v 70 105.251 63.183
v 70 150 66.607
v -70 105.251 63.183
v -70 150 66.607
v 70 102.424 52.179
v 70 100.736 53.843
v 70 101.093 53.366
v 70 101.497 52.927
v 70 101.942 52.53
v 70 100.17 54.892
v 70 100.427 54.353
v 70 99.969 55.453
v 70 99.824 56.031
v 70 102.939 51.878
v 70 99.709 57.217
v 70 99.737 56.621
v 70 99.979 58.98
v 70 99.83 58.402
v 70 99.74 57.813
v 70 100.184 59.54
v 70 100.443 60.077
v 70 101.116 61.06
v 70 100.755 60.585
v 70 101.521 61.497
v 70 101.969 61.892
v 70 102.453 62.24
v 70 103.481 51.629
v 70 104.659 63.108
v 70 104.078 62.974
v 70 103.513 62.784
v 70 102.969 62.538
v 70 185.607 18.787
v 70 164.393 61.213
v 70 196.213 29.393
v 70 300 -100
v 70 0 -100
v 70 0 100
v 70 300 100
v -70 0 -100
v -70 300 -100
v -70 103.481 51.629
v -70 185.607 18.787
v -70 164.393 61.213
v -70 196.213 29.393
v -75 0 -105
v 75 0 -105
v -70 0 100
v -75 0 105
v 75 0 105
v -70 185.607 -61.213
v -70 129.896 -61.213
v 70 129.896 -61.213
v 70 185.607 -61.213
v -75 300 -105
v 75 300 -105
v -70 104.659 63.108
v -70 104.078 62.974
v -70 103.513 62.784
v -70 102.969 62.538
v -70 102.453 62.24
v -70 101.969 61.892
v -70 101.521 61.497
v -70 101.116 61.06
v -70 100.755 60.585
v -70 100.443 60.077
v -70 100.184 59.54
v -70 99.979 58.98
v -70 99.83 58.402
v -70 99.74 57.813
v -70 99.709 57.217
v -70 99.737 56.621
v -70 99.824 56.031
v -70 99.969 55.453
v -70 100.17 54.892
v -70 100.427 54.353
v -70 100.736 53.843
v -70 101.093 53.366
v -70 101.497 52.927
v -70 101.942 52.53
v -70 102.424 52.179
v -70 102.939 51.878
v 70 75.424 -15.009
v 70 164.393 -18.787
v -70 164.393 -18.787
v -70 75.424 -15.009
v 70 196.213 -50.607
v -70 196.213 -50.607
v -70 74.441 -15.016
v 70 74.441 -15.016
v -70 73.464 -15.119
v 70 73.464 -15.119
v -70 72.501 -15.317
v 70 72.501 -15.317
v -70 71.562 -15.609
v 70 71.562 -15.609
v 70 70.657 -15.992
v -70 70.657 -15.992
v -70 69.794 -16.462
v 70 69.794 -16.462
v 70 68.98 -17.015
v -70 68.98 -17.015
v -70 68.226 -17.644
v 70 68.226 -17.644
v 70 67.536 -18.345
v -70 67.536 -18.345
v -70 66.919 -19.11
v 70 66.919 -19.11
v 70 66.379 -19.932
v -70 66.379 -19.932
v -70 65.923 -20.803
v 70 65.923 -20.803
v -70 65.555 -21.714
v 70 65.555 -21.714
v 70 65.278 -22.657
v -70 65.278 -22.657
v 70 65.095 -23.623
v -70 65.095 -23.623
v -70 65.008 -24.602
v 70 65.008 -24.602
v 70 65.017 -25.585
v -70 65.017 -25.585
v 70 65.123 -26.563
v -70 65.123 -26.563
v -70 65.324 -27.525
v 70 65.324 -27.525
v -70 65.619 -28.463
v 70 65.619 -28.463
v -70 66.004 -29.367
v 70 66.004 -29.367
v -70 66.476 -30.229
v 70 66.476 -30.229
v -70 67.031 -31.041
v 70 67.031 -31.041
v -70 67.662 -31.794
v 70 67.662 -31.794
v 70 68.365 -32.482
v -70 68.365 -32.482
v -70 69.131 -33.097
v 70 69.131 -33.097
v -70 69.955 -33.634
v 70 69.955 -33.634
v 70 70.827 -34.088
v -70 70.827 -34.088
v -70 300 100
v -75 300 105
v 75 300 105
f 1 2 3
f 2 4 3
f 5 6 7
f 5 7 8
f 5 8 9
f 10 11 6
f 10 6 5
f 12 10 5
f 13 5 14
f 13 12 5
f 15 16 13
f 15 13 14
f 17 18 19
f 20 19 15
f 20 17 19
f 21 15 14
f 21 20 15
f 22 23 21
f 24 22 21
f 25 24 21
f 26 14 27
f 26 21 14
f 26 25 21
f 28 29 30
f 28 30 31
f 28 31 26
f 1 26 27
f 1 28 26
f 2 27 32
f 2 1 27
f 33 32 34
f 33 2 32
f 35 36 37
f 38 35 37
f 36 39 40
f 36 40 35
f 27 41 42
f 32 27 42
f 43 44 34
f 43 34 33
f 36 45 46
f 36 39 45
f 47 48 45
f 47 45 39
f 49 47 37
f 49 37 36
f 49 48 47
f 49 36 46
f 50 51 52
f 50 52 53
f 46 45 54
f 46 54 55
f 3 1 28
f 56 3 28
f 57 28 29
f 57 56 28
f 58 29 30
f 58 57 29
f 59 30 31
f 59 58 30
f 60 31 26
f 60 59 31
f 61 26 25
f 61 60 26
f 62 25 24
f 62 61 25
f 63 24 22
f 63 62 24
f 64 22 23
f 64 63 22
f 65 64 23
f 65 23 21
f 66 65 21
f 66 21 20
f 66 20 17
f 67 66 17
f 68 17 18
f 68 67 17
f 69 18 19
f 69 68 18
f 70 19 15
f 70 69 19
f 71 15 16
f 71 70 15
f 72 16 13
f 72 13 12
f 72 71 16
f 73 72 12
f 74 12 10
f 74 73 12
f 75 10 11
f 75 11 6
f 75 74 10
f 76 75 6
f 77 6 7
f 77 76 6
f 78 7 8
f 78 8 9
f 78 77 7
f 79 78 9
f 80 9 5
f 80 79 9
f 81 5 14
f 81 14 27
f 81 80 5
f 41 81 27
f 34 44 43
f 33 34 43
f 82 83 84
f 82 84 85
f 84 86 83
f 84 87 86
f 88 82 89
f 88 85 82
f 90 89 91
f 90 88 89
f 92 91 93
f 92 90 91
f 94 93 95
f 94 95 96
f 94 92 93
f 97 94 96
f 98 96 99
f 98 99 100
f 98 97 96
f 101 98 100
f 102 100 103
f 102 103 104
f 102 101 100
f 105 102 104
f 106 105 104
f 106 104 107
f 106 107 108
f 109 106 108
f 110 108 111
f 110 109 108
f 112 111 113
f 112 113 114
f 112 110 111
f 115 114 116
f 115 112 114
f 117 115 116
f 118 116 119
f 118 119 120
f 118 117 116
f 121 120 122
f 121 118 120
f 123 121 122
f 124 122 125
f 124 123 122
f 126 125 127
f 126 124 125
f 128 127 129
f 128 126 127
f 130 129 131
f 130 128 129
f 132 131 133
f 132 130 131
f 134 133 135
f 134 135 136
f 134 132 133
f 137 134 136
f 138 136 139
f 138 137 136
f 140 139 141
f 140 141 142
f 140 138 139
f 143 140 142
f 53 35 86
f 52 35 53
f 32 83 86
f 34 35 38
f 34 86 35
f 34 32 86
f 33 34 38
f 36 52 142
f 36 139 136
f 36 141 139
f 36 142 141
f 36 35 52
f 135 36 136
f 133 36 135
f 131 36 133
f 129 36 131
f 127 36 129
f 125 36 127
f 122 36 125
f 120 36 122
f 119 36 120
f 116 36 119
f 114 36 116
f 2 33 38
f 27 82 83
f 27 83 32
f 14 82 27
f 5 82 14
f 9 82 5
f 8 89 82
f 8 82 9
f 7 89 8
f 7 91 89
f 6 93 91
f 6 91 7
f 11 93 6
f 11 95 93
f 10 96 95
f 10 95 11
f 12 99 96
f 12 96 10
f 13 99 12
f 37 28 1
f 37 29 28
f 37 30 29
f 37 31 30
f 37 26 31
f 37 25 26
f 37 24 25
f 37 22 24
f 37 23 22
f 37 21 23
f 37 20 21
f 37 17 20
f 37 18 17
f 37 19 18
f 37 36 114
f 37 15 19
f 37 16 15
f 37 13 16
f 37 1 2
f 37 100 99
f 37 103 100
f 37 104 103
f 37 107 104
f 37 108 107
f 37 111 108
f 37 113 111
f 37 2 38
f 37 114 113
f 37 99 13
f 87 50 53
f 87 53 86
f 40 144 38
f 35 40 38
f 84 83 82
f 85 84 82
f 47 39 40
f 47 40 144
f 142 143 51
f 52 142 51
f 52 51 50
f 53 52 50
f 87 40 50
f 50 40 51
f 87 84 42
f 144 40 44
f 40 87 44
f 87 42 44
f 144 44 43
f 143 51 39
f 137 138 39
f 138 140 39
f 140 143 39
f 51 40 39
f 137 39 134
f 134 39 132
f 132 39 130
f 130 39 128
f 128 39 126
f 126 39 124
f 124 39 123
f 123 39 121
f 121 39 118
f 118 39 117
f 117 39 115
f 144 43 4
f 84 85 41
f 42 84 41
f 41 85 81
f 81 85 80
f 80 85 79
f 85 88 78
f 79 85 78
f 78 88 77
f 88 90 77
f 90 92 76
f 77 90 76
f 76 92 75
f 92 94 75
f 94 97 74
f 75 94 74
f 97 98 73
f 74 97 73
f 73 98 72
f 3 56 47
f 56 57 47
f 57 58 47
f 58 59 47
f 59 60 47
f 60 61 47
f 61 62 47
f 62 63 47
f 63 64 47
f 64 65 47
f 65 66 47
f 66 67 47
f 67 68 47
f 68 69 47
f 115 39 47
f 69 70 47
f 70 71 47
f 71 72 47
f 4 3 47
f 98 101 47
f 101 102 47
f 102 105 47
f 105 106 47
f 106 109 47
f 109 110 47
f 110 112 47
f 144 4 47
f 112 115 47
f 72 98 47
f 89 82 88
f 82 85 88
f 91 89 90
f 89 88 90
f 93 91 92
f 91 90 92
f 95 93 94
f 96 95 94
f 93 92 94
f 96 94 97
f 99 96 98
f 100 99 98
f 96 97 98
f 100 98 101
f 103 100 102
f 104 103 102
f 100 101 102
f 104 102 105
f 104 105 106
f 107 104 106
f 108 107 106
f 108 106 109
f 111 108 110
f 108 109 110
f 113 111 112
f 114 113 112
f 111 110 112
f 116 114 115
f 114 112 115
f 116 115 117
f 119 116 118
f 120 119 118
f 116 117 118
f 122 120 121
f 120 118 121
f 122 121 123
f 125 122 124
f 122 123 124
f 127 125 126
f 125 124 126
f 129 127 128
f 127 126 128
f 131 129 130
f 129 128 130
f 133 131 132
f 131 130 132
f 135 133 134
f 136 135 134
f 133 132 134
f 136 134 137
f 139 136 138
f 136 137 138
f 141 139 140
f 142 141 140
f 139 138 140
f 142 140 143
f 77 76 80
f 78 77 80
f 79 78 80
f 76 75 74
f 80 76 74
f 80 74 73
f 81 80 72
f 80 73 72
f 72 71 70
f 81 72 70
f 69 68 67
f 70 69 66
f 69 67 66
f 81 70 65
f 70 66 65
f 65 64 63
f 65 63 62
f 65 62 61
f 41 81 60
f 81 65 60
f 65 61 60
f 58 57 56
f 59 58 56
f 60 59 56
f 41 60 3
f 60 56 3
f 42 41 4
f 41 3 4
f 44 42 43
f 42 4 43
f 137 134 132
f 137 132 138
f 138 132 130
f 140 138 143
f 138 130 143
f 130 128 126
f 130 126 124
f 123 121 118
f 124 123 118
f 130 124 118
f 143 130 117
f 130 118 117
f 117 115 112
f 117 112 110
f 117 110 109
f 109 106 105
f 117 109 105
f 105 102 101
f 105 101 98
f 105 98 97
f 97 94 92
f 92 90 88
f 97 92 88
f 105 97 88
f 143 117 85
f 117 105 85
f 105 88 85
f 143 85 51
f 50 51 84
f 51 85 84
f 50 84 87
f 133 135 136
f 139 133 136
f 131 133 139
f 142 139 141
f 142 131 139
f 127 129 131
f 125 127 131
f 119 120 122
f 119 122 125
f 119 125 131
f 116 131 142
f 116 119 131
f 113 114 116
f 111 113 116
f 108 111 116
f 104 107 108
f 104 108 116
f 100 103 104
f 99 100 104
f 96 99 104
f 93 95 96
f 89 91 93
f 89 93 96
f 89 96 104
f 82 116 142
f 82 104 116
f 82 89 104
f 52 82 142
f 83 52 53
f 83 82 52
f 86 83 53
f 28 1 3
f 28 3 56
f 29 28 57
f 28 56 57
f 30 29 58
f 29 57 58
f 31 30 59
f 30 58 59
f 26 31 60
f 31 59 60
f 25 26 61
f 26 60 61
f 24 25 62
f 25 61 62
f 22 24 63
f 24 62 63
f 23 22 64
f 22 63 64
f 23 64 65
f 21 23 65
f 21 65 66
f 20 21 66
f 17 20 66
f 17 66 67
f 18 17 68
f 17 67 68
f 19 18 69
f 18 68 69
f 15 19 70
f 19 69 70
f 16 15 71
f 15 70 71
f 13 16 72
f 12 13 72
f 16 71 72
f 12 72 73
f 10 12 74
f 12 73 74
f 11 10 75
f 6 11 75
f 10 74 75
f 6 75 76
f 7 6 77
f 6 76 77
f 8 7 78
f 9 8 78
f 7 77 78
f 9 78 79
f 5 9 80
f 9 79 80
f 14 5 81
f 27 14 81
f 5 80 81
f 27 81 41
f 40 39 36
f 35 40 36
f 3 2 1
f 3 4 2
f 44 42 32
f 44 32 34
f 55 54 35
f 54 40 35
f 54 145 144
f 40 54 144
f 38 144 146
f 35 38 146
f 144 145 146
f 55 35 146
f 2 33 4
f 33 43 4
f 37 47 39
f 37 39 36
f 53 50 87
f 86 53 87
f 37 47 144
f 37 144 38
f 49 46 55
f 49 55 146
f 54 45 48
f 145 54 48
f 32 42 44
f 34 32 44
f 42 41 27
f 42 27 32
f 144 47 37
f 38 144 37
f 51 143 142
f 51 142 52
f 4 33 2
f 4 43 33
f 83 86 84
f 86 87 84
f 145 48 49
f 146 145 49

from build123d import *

# Parameters (mm, degrees)
F0_W          = 149.9999934435
F0_H          = 209.9999934435
F0_W_2        = 140
F0_H_2        = 200
F1_DEPTH      = 300
F3_DEPTH      = 70
F3_DEPTH_BACK = 70
F4_DEPTH      = 70
F4_DEPTH_BACK = 70
F5_W          = 140
F5_H          = 200
F6_DEPTH      = 300


with BuildPart() as f1:
    # F0 (on Front) → F1 (new body)
    with BuildSketch(Plane.XZ):
        Rectangle(F0_W, F0_H)
        Rectangle(F0_W_2, F0_H_2, mode=Mode.SUBTRACT)
    extrude(amount=-F1_DEPTH)


with BuildPart() as f3:
    # F2 (on Right) → F3 (new body, two sides)
    with BuildSketch(Plane.YZ) as f3_sk:
        with BuildLine():
            Line((196.2132034356, 29.3933982822), (164.3933982822, 61.2132034356))
            Line((164.3933982822, 61.2132034356), (150, 66.6066017178))
            Line((150, 66.6066017178), (105.2509304011, 63.1825119437))
            ThreePointArc((105.2509304011, 63.1825119437), (99.7778999204, 58.1086464805), (103.4808305396, 51.6289490947))
            Line((103.4808305396, 51.6289490947), (185.6066017178, 18.7867965644))
            Line((185.6066017178, 18.7867965644), (196.2132034356, 29.3933982822))
        make_face()
    extrude(amount=-F3_DEPTH)
    extrude(f3_sk.sketch, amount=F3_DEPTH_BACK)


with BuildPart() as f4:
    # F2 (on Right) → F4 (new body, two sides)
    with BuildSketch(Plane.YZ) as f4_sk:
        with BuildLine():
            Line((185.6066017178, -61.2132034356), (196.2132034356, -50.6066017178))
            Line((196.2132034356, -50.6066017178), (164.3933982822, -18.7867965644))
            Line((164.3933982822, -18.7867965644), (75.424236051, -15.0090028639))
            ThreePointArc((75.424236051, -15.0090028639), (65.2782747437, -22.6573395378), (70.8268318838, -34.0876106801))
            Line((70.8268318838, -34.0876106801), (129.8963013047, -61.2132034356))
            Line((129.8963013047, -61.2132034356), (185.6066017178, -61.2132034356))
        make_face()
    extrude(amount=-F4_DEPTH)
    extrude(f4_sk.sketch, amount=F4_DEPTH_BACK)


with BuildPart() as f6:
    # F5 (on Front) → F6 (new body)
    with BuildSketch(Plane.XZ):
        Rectangle(F5_W, F5_H)
    extrude(amount=-F6_DEPTH)

    # F7: cut F3, F4
    add(f3.part, mode=Mode.SUBTRACT)
    add(f4.part, mode=Mode.SUBTRACT)


solid = Compound([f1.part, f3.part, f4.part, f6.part])
